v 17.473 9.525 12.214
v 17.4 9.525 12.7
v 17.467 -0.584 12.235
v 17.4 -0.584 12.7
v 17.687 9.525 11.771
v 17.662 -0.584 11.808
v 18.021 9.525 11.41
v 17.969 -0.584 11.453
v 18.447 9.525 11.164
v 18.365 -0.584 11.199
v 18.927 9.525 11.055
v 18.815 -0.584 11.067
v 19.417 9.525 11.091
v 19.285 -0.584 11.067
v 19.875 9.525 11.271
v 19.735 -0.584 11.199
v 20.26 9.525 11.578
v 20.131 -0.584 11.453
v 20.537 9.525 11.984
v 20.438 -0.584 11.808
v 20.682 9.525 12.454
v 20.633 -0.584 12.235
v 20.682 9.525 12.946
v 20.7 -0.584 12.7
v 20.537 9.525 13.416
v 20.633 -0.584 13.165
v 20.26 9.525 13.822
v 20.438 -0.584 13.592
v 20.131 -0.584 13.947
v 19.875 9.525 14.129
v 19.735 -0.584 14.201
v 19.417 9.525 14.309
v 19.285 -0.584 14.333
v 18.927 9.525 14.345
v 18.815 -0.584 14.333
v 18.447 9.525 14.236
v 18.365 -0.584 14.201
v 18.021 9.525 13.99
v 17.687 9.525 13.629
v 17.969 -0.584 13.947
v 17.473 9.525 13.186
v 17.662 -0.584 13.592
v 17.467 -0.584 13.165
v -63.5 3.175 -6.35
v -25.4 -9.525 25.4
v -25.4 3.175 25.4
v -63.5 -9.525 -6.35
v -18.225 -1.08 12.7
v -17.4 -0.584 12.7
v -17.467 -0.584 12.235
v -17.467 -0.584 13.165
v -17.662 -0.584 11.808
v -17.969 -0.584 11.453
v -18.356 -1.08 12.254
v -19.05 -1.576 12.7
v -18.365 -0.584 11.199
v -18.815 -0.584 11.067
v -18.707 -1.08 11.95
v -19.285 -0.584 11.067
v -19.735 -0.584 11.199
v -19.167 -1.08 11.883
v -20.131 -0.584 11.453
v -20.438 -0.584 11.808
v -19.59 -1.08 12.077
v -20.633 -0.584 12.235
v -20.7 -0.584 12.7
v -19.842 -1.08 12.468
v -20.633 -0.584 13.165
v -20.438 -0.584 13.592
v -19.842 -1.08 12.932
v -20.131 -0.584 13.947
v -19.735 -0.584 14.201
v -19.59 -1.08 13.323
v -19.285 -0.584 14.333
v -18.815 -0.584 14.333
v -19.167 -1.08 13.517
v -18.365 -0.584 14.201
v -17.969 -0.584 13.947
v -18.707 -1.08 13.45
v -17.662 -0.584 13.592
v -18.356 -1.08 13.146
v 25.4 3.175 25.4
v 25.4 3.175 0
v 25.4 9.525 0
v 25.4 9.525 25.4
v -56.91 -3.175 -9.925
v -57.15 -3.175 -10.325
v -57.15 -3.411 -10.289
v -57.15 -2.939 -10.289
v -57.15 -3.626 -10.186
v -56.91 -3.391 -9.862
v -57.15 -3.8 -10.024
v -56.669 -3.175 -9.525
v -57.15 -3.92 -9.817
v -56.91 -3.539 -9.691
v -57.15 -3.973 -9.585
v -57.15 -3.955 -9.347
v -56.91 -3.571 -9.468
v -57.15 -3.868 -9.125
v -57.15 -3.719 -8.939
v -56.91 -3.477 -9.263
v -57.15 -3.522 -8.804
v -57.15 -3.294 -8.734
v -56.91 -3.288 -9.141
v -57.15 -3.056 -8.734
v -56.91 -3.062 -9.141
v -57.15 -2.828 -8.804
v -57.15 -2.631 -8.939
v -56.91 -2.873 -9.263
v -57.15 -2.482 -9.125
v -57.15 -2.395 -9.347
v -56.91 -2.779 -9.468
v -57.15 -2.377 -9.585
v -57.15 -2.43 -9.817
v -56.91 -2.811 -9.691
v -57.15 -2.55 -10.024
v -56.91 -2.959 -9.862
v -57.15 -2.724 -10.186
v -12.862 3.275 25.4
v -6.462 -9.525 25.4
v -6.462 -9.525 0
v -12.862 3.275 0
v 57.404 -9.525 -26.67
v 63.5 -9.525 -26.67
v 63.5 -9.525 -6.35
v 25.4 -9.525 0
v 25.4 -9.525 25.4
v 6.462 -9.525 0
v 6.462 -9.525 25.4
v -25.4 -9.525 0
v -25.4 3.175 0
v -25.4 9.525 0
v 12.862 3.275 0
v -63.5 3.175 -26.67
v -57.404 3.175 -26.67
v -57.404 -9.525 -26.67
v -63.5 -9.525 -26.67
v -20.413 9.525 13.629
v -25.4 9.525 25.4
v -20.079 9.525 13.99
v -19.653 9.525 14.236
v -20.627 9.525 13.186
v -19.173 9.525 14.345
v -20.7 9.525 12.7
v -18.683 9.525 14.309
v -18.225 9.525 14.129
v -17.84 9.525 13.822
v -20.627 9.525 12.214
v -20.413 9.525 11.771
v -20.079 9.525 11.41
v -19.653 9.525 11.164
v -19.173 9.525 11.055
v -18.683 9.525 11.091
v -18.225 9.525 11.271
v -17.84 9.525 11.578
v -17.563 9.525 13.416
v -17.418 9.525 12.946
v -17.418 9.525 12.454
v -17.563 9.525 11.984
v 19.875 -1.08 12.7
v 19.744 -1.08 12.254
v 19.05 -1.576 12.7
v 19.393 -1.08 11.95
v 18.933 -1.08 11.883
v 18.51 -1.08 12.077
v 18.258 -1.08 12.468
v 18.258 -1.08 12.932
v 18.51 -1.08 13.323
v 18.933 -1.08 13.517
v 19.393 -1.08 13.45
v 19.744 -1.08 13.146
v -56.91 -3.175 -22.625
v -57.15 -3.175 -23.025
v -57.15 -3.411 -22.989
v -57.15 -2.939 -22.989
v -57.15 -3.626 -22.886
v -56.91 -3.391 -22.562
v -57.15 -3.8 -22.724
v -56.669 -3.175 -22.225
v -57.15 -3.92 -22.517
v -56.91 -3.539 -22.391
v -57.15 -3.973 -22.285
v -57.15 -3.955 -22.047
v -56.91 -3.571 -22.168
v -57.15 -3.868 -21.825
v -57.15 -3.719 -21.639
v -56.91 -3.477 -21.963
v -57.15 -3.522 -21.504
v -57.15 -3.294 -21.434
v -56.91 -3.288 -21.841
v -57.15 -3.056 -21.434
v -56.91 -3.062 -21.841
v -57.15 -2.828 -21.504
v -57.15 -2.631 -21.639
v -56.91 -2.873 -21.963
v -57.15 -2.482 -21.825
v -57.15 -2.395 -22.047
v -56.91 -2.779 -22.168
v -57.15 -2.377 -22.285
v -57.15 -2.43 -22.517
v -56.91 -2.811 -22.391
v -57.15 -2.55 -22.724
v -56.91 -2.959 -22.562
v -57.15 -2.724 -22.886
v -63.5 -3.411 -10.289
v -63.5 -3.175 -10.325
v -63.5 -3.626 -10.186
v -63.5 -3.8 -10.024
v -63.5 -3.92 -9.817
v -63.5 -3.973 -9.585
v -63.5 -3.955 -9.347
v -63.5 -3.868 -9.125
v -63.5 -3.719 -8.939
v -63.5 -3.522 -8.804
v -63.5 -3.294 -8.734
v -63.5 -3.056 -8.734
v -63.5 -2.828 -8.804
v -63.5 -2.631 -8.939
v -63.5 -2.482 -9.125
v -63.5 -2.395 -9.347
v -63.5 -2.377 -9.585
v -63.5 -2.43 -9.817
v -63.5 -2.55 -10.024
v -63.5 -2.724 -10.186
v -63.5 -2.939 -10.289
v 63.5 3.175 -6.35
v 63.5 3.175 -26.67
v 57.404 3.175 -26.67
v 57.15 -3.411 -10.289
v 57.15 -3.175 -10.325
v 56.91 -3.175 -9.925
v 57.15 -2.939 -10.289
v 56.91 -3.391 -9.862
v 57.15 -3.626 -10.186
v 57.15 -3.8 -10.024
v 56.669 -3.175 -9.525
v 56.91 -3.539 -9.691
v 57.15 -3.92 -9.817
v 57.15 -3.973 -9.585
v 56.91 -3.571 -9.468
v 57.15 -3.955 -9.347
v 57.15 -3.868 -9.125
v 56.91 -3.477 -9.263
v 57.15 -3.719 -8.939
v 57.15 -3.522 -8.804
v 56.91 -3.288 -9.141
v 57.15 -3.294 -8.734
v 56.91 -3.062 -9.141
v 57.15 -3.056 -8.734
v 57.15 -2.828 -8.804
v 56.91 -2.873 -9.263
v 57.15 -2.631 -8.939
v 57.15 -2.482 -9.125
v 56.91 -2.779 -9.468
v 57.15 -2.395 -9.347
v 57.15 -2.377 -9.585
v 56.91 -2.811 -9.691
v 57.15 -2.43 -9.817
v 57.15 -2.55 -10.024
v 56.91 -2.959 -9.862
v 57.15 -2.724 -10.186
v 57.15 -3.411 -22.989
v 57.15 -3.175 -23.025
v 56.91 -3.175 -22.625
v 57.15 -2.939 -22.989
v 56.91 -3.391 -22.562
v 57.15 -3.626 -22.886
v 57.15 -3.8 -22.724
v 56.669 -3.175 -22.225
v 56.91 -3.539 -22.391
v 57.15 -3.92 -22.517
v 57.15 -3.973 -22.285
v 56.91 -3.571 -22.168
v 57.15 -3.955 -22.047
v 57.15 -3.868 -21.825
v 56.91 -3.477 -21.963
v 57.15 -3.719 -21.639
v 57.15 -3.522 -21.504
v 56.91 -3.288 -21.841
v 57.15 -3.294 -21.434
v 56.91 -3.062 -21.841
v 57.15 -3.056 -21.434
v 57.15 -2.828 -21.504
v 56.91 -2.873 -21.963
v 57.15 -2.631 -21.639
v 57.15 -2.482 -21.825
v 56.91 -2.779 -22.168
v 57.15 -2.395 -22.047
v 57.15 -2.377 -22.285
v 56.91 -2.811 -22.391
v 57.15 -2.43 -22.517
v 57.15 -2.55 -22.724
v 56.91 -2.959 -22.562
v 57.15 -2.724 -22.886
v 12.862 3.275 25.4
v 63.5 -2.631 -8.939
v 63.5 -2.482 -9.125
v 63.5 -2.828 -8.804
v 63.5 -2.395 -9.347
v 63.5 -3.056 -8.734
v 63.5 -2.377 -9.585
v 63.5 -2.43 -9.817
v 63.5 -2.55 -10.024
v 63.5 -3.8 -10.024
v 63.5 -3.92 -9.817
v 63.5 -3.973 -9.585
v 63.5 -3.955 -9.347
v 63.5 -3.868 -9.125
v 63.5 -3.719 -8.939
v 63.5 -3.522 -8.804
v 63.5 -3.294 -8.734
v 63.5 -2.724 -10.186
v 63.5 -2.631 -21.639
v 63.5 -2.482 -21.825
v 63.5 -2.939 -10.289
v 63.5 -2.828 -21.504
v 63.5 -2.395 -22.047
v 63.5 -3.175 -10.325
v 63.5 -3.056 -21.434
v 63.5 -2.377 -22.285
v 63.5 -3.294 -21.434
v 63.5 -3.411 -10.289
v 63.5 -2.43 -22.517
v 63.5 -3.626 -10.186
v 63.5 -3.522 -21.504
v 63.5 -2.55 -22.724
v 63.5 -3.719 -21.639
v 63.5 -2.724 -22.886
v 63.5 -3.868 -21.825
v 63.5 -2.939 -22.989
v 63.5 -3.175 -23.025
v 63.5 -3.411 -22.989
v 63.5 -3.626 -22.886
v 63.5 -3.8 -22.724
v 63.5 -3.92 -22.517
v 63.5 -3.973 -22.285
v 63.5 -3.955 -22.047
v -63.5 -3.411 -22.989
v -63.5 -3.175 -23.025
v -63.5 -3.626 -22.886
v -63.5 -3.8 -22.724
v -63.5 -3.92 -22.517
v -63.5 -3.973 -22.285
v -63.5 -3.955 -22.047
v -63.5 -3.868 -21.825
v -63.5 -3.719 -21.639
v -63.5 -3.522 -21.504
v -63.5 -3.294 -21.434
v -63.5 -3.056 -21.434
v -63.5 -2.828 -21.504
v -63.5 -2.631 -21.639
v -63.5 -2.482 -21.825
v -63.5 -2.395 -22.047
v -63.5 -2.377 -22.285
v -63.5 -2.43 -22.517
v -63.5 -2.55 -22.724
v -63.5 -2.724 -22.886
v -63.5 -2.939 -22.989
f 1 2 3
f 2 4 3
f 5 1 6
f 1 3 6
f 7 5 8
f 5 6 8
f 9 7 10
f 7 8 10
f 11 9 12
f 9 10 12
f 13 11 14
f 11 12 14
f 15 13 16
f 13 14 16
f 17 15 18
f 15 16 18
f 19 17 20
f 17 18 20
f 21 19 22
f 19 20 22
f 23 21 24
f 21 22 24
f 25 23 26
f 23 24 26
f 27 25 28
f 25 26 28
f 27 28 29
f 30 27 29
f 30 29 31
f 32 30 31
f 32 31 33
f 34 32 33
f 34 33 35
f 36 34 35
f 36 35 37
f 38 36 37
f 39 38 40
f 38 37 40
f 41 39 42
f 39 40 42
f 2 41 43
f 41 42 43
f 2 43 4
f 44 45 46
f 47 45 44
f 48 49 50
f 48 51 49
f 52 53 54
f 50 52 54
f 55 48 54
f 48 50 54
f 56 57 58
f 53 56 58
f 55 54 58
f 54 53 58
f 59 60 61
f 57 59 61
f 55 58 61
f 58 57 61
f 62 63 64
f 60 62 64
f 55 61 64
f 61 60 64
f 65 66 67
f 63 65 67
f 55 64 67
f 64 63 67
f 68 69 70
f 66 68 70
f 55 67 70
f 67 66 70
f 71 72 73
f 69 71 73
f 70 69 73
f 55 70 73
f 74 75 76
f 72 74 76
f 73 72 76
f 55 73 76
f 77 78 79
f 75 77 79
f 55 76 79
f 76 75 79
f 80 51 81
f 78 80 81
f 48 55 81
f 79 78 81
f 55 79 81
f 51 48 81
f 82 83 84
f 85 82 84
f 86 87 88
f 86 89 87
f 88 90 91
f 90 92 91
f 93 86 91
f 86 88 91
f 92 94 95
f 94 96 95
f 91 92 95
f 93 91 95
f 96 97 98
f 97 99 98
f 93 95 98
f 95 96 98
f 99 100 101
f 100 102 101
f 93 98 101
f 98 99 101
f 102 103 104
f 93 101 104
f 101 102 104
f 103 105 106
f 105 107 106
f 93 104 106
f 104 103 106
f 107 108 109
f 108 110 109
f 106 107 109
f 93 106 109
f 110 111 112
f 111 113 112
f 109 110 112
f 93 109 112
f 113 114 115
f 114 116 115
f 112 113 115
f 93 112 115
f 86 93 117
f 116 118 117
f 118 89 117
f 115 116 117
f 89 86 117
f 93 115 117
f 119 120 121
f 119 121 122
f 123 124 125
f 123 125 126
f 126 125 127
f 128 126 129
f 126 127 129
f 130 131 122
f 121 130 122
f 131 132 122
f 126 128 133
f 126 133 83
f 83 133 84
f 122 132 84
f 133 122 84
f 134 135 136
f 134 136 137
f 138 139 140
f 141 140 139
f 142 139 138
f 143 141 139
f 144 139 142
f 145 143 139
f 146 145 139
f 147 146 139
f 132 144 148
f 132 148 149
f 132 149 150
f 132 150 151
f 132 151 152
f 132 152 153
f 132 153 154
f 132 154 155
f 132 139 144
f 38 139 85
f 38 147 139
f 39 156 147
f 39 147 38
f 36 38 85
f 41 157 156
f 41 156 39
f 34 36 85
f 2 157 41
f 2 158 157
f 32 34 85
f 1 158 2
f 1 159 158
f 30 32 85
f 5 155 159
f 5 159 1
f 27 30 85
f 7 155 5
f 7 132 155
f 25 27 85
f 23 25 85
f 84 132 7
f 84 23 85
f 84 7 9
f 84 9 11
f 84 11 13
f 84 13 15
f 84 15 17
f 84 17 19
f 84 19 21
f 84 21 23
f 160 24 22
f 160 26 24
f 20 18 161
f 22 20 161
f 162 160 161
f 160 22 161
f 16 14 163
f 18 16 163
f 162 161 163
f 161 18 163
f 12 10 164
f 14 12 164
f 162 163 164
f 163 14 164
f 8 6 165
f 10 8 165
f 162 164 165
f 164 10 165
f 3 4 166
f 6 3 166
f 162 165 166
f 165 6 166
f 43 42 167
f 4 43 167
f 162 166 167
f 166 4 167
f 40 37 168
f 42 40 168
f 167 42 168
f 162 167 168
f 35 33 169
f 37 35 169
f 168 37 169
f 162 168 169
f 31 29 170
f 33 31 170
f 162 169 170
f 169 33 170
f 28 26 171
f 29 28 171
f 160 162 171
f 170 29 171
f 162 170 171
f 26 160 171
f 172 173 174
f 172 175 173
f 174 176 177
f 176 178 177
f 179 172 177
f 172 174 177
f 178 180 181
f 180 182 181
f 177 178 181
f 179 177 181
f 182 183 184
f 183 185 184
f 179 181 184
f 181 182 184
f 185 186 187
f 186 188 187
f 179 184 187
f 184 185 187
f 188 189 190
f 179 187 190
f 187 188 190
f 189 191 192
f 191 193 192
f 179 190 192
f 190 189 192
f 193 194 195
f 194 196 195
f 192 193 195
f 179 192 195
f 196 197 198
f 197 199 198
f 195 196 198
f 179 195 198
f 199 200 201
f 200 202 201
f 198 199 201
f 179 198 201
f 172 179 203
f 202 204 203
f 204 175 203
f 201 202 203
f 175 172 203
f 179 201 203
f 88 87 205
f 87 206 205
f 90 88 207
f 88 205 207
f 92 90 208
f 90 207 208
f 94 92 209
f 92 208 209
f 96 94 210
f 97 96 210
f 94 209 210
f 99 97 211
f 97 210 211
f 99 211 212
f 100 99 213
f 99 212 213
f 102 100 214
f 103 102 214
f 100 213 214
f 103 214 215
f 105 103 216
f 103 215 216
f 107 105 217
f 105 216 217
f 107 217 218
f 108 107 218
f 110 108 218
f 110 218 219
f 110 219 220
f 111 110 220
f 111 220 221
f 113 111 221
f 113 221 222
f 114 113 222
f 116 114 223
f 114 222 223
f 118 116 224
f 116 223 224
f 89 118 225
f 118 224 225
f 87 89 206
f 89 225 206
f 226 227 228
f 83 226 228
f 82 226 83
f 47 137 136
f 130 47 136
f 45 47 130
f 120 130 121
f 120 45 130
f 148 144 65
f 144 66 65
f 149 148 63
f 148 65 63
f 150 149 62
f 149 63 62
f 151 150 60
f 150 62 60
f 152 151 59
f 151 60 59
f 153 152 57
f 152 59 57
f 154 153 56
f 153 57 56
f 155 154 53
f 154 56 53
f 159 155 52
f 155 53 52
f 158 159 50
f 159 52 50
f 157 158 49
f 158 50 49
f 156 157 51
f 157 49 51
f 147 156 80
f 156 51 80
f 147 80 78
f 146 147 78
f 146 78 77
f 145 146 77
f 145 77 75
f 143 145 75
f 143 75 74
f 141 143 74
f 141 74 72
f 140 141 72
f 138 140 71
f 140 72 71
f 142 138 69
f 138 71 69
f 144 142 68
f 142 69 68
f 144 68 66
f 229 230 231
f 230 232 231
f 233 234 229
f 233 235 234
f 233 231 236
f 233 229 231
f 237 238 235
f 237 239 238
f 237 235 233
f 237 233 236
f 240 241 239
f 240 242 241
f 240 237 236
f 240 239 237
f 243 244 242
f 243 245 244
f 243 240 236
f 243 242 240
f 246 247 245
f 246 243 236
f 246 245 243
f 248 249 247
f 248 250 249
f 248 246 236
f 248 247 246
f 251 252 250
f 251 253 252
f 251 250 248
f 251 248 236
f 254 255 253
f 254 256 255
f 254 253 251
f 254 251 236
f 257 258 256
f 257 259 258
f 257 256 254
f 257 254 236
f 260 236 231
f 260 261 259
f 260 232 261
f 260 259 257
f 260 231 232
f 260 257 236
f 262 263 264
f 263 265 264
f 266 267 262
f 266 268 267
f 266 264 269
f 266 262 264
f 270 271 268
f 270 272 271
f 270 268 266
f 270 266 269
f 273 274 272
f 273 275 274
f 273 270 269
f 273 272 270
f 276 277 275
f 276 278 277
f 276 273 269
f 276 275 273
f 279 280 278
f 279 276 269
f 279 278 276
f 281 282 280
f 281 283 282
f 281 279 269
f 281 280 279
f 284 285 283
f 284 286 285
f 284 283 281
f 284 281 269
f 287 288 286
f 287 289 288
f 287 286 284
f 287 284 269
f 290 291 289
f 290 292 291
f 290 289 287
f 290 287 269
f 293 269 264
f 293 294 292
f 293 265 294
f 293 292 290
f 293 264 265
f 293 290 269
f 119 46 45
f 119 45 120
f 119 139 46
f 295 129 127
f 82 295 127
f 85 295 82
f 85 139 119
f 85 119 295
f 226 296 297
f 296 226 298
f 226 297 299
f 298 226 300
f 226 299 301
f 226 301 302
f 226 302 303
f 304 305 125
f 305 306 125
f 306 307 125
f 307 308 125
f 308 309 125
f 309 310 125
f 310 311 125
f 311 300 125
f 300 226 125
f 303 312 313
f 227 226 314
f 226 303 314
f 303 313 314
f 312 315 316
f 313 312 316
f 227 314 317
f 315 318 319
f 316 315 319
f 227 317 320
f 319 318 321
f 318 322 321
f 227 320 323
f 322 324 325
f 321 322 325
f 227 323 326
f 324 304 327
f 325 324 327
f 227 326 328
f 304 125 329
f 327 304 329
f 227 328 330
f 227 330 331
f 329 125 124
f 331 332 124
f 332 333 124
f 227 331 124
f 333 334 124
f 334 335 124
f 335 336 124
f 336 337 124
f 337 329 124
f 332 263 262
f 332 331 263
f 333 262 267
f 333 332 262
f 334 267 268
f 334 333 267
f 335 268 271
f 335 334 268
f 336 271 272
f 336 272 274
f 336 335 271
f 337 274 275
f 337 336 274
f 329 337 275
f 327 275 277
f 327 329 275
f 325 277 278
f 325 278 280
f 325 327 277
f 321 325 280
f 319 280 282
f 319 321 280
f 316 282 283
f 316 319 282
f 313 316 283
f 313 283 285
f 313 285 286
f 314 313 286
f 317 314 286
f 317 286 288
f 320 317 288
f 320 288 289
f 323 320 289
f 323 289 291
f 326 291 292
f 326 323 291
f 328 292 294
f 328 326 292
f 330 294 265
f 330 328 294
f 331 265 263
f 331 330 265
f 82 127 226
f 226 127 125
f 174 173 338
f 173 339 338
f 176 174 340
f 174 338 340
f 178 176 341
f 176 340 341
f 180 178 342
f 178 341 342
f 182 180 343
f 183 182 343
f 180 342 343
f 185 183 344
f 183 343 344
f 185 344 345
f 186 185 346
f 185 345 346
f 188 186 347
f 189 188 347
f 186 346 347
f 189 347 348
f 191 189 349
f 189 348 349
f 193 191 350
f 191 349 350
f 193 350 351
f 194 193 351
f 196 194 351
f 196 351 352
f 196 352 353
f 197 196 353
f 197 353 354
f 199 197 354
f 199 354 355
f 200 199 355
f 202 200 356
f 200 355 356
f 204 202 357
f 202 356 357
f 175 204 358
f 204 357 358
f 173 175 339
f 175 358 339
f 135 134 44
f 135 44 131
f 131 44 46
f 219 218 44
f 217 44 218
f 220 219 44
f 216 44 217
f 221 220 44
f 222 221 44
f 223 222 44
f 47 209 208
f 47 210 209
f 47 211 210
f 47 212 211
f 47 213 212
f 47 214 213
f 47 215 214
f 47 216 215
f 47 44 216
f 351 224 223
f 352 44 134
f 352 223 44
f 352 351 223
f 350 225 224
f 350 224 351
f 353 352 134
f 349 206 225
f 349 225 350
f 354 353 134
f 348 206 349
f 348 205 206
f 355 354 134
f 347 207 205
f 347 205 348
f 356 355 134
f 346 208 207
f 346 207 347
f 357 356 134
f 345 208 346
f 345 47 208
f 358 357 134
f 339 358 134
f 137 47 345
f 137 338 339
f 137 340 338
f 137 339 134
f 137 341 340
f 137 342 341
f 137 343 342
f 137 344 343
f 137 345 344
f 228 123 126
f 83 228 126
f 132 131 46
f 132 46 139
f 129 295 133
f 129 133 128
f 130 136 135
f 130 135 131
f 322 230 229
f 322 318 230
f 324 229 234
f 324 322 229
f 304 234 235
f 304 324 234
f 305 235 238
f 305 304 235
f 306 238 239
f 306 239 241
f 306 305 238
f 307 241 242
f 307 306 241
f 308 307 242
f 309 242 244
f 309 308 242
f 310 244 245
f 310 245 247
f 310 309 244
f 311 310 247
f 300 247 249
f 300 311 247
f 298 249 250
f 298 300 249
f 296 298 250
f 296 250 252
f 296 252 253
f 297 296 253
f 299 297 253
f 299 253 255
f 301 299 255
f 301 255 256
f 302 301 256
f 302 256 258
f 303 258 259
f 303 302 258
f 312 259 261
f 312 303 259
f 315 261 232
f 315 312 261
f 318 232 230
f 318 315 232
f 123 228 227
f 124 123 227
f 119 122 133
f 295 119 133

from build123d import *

# Parameters (mm, degrees)
SKETCH1_W                      = 50.8
SKETCH1_H                      = 19.05
BOSS_EXTRUDE1_DEPTH            = 25.4
CUT_EXTRUDE1_DEPTH             = 38.162422217
CUT_EXTRUDE1_DEPTH_BACK        = 38.1
M4X0_7_TAPPED_HOLE1_D          = 3.3
M4X0_7_TAPPED_HOLE1_DEPTH      = 10.1092
M4X0_7_TAPPED_HOLE1_TIP        = 0.991420021
BOSS_EXTRUDE4_DEPTH            = 12.7
M2X0_4_TAPPED_HOLE1_AT_2_COUNT = 2
M2X0_4_TAPPED_HOLE1_AT_2_PITCH = 12.7
CUT_EXTRUDE2_DEPTH             = 12.7


with BuildPart() as part:
    # Sketch1 → Boss-Extrude1 (new body)
    with BuildSketch(Plane.XY):
        Rectangle(SKETCH1_W, SKETCH1_H)
    extrude(amount=BOSS_EXTRUDE1_DEPTH)

    # Sketch2 → Cut-Extrude1 (cut, two sides)
    with BuildSketch(Plane(origin=(0, 0, 0), x_dir=(-1, 0, 0), z_dir=(0, 0, -1))) as cut_extrude1_sk:
        Polygon((-6.461803399, -9.525), (-6.35, -9.525), (-12.7, 3.175), (12.7, 3.175), (6.35, -9.525), (6.461803399, -9.525), (12.861803399, 3.275), (-12.861803399, 3.275), align=None)
        Polygon((-12.7, 3.175), (-6.35, -9.525), (6.35, -9.525), (12.7, 3.175), align=None)
    extrude(amount=CUT_EXTRUDE1_DEPTH, mode=Mode.SUBTRACT)
    extrude(cut_extrude1_sk.sketch, amount=-CUT_EXTRUDE1_DEPTH_BACK, mode=Mode.SUBTRACT)

    # M4x0.7 Tapped Hole1
    with Locations(Plane(origin=(0, 9.525, 0), x_dir=(1, 0, 0), z_dir=(0, 1, 0))):
        with Locations((-19.05, -12.7), (19.05, -12.7)):
            Hole(M4X0_7_TAPPED_HOLE1_D / 2, depth=M4X0_7_TAPPED_HOLE1_DEPTH)
            with Locations((0, 0, -(M4X0_7_TAPPED_HOLE1_DEPTH + M4X0_7_TAPPED_HOLE1_TIP / 2))):  # 118° drill point
                Cone(0, M4X0_7_TAPPED_HOLE1_D / 2, M4X0_7_TAPPED_HOLE1_TIP, mode=Mode.SUBTRACT)

    # Sketch8 → Boss-Extrude4 (add)
    with BuildSketch(Plane.XZ.offset(9.525)):
        Polygon((25.4, 25.4), (63.5, -6.35), (63.5, -31.75), (25.4, 0), align=None)
    boss_extrude4 = extrude(amount=-BOSS_EXTRUDE4_DEPTH)

    # Sketch19 → M2x0.4 Tapped Hole1 (revolve, cut)
    with BuildSketch(Plane(origin=(63.5, -3.175, -22.225), x_dir=(0, 0, -1), z_dir=(0, 1, 0))):
        Polygon((0, 0), (0, 6.830688495), (0.8, 6.35), (0.8, 0), align=None)
    m2x0_4_tapped_hole1 = revolve(axis=Axis((69.85, -3.175, -22.225), (-1, 0, 0)), mode=Mode.SUBTRACT)

    # M2x0.4 Tapped Hole1 at 2: M2x0.4 Tapped Hole1 ×2
    with Locations(*[(0, 0, i * M2X0_4_TAPPED_HOLE1_AT_2_PITCH) for i in range(1, M2X0_4_TAPPED_HOLE1_AT_2_COUNT)]):
        add(m2x0_4_tapped_hole1, mode=Mode.SUBTRACT)

    # Sketch20 → Cut-Extrude2 (cut)
    with BuildSketch(Plane(origin=(0, 3.175, 0), x_dir=(1, 0, 0), z_dir=(0, 1, 0))):
        Polygon((57.404, 26.67), (63.5, 26.67), (63.5, 31.75), align=None)
    cut_extrude2 = extrude(amount=-CUT_EXTRUDE2_DEPTH, mode=Mode.SUBTRACT)

    # Mirror1: Boss-Extrude4, M2x0.4 Tapped Hole1, Cut-Extrude2 across plane
    add(boss_extrude4.mirror(Plane(origin=(0, 0, 0), x_dir=(0, 0, 1), z_dir=(1, 0, 0))))
    add(m2x0_4_tapped_hole1.mirror(Plane(origin=(0, 0, 0), x_dir=(0, 0, 1), z_dir=(1, 0, 0))), mode=Mode.SUBTRACT)
    add(cut_extrude2.mirror(Plane(origin=(0, 0, 0), x_dir=(0, 0, 1), z_dir=(1, 0, 0))), mode=Mode.SUBTRACT)

    # Mirror1 copy 1 sketch → Mirror1 copy 1 (revolve, cut)
    with BuildSketch(Plane(origin=(-63.5, -3.175, -9.525), x_dir=(0, 0, -1), z_dir=(0, 1, 0))):
        Polygon((0, 0), (0, -6.830688495), (0.8, -6.35), (0.8, 0), align=None)
    revolve(axis=Axis((-69.85, -3.175, -9.525), (-1, 0, 0)), mode=Mode.SUBTRACT)


solid = part.part
